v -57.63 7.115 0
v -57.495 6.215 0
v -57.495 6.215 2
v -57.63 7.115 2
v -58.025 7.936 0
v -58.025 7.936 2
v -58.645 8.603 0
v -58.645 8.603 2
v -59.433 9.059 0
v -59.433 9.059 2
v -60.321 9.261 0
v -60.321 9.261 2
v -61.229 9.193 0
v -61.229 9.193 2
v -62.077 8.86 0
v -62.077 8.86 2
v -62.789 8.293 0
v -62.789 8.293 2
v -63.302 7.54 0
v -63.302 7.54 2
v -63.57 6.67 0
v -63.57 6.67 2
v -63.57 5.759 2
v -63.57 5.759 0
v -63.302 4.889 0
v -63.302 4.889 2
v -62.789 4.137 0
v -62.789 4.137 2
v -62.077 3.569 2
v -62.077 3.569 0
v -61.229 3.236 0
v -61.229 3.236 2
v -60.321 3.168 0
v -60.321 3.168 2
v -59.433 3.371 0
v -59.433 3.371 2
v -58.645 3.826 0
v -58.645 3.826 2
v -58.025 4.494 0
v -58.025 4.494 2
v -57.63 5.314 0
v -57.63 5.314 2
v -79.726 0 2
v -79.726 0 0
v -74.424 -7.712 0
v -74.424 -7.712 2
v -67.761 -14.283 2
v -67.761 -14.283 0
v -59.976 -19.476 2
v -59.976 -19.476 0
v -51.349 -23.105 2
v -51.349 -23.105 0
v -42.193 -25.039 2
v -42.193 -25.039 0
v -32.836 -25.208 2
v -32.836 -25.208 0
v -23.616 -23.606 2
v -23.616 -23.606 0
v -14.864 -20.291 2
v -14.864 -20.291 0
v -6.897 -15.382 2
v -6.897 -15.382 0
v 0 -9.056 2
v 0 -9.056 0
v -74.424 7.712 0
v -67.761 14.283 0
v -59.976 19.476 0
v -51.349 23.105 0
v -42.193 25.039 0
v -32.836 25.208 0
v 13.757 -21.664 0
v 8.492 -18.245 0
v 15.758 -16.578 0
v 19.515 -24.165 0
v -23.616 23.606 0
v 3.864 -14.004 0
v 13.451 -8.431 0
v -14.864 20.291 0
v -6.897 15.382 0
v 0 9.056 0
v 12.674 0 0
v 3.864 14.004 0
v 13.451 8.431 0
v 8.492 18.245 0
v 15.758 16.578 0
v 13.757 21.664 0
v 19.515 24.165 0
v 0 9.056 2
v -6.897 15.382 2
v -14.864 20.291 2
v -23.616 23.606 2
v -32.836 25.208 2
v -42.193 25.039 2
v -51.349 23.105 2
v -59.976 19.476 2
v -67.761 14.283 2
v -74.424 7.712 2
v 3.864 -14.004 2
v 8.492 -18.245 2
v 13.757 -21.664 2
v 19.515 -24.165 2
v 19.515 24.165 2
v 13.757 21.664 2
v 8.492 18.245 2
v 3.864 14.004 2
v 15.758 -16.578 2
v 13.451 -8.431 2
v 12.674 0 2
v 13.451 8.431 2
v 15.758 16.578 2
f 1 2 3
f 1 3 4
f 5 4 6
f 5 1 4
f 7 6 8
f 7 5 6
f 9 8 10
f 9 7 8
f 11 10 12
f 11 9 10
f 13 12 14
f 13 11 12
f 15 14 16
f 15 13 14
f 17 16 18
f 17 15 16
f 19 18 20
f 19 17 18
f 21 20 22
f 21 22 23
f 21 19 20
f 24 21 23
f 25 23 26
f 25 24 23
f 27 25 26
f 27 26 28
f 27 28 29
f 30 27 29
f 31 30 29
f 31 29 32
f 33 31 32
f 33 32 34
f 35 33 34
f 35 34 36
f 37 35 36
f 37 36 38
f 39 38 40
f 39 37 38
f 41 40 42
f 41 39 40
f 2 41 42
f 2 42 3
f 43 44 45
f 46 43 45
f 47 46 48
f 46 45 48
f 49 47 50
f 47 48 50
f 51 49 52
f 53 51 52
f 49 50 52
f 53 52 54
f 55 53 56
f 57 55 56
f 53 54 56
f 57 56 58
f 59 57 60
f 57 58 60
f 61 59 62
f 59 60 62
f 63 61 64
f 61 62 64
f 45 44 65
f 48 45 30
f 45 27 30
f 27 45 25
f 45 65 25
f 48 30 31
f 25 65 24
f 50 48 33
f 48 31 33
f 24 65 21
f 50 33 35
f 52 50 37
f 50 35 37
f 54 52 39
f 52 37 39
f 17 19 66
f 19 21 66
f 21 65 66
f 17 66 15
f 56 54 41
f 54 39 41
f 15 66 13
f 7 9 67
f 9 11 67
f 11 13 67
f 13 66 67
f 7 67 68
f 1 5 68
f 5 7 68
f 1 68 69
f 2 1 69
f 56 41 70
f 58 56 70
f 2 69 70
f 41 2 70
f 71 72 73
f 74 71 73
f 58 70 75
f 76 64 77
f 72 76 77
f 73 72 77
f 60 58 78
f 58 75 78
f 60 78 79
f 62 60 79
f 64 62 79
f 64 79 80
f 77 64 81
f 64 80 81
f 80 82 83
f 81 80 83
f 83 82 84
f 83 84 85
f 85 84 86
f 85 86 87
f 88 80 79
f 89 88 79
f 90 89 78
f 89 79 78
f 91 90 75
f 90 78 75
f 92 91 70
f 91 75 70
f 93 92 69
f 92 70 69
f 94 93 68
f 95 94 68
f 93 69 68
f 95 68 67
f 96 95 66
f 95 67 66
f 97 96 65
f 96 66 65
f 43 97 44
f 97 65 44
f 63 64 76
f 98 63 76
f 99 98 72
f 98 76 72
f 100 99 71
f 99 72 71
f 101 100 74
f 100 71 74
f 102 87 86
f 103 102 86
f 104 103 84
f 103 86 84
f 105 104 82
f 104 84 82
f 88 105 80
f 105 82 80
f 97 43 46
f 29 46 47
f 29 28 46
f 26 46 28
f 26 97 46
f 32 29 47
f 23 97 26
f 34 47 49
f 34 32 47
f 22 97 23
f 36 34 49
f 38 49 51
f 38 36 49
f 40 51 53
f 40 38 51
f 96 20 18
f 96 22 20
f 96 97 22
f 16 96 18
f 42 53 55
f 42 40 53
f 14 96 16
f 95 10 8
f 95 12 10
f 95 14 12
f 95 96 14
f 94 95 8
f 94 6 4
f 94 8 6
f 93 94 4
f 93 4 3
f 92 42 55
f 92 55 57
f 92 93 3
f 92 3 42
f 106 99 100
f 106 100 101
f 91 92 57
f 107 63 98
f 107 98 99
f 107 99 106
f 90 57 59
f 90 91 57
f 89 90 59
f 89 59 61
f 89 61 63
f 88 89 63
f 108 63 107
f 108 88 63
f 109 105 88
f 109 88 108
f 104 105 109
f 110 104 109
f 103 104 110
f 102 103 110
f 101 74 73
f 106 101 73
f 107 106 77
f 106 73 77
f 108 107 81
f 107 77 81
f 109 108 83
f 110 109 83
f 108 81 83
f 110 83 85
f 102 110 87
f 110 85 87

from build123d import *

# Parameters (mm, degrees)
F0_R     = 3.054934
F1_DEPTH = 2


with BuildPart() as f1:
    # F0 (on Top) → F1 (new body)
    with BuildSketch(Plane.XY):
        with BuildLine():
            ThreePointArc((19.515011, 24.16541), (8.491912, 18.245194), (0, 9.055791))
            ThreePointArc((0, 9.055791), (-42.193006, 25.039156), (-79.726435, 0))
            ThreePointArc((-79.726435, 0), (-42.193006, -25.039156), (0, -9.055791))
            ThreePointArc((0, -9.055791), (8.491912, -18.245194), (19.515011, -24.16541))
            ThreePointArc((19.515011, -24.16541), (12.673698, 0), (19.515011, 24.16541))
        make_face()
        with Locations((-60.549479, 6.214748)):
            Circle(F0_R, mode=Mode.SUBTRACT)
    extrude(amount=F1_DEPTH)


solid = f1.part
